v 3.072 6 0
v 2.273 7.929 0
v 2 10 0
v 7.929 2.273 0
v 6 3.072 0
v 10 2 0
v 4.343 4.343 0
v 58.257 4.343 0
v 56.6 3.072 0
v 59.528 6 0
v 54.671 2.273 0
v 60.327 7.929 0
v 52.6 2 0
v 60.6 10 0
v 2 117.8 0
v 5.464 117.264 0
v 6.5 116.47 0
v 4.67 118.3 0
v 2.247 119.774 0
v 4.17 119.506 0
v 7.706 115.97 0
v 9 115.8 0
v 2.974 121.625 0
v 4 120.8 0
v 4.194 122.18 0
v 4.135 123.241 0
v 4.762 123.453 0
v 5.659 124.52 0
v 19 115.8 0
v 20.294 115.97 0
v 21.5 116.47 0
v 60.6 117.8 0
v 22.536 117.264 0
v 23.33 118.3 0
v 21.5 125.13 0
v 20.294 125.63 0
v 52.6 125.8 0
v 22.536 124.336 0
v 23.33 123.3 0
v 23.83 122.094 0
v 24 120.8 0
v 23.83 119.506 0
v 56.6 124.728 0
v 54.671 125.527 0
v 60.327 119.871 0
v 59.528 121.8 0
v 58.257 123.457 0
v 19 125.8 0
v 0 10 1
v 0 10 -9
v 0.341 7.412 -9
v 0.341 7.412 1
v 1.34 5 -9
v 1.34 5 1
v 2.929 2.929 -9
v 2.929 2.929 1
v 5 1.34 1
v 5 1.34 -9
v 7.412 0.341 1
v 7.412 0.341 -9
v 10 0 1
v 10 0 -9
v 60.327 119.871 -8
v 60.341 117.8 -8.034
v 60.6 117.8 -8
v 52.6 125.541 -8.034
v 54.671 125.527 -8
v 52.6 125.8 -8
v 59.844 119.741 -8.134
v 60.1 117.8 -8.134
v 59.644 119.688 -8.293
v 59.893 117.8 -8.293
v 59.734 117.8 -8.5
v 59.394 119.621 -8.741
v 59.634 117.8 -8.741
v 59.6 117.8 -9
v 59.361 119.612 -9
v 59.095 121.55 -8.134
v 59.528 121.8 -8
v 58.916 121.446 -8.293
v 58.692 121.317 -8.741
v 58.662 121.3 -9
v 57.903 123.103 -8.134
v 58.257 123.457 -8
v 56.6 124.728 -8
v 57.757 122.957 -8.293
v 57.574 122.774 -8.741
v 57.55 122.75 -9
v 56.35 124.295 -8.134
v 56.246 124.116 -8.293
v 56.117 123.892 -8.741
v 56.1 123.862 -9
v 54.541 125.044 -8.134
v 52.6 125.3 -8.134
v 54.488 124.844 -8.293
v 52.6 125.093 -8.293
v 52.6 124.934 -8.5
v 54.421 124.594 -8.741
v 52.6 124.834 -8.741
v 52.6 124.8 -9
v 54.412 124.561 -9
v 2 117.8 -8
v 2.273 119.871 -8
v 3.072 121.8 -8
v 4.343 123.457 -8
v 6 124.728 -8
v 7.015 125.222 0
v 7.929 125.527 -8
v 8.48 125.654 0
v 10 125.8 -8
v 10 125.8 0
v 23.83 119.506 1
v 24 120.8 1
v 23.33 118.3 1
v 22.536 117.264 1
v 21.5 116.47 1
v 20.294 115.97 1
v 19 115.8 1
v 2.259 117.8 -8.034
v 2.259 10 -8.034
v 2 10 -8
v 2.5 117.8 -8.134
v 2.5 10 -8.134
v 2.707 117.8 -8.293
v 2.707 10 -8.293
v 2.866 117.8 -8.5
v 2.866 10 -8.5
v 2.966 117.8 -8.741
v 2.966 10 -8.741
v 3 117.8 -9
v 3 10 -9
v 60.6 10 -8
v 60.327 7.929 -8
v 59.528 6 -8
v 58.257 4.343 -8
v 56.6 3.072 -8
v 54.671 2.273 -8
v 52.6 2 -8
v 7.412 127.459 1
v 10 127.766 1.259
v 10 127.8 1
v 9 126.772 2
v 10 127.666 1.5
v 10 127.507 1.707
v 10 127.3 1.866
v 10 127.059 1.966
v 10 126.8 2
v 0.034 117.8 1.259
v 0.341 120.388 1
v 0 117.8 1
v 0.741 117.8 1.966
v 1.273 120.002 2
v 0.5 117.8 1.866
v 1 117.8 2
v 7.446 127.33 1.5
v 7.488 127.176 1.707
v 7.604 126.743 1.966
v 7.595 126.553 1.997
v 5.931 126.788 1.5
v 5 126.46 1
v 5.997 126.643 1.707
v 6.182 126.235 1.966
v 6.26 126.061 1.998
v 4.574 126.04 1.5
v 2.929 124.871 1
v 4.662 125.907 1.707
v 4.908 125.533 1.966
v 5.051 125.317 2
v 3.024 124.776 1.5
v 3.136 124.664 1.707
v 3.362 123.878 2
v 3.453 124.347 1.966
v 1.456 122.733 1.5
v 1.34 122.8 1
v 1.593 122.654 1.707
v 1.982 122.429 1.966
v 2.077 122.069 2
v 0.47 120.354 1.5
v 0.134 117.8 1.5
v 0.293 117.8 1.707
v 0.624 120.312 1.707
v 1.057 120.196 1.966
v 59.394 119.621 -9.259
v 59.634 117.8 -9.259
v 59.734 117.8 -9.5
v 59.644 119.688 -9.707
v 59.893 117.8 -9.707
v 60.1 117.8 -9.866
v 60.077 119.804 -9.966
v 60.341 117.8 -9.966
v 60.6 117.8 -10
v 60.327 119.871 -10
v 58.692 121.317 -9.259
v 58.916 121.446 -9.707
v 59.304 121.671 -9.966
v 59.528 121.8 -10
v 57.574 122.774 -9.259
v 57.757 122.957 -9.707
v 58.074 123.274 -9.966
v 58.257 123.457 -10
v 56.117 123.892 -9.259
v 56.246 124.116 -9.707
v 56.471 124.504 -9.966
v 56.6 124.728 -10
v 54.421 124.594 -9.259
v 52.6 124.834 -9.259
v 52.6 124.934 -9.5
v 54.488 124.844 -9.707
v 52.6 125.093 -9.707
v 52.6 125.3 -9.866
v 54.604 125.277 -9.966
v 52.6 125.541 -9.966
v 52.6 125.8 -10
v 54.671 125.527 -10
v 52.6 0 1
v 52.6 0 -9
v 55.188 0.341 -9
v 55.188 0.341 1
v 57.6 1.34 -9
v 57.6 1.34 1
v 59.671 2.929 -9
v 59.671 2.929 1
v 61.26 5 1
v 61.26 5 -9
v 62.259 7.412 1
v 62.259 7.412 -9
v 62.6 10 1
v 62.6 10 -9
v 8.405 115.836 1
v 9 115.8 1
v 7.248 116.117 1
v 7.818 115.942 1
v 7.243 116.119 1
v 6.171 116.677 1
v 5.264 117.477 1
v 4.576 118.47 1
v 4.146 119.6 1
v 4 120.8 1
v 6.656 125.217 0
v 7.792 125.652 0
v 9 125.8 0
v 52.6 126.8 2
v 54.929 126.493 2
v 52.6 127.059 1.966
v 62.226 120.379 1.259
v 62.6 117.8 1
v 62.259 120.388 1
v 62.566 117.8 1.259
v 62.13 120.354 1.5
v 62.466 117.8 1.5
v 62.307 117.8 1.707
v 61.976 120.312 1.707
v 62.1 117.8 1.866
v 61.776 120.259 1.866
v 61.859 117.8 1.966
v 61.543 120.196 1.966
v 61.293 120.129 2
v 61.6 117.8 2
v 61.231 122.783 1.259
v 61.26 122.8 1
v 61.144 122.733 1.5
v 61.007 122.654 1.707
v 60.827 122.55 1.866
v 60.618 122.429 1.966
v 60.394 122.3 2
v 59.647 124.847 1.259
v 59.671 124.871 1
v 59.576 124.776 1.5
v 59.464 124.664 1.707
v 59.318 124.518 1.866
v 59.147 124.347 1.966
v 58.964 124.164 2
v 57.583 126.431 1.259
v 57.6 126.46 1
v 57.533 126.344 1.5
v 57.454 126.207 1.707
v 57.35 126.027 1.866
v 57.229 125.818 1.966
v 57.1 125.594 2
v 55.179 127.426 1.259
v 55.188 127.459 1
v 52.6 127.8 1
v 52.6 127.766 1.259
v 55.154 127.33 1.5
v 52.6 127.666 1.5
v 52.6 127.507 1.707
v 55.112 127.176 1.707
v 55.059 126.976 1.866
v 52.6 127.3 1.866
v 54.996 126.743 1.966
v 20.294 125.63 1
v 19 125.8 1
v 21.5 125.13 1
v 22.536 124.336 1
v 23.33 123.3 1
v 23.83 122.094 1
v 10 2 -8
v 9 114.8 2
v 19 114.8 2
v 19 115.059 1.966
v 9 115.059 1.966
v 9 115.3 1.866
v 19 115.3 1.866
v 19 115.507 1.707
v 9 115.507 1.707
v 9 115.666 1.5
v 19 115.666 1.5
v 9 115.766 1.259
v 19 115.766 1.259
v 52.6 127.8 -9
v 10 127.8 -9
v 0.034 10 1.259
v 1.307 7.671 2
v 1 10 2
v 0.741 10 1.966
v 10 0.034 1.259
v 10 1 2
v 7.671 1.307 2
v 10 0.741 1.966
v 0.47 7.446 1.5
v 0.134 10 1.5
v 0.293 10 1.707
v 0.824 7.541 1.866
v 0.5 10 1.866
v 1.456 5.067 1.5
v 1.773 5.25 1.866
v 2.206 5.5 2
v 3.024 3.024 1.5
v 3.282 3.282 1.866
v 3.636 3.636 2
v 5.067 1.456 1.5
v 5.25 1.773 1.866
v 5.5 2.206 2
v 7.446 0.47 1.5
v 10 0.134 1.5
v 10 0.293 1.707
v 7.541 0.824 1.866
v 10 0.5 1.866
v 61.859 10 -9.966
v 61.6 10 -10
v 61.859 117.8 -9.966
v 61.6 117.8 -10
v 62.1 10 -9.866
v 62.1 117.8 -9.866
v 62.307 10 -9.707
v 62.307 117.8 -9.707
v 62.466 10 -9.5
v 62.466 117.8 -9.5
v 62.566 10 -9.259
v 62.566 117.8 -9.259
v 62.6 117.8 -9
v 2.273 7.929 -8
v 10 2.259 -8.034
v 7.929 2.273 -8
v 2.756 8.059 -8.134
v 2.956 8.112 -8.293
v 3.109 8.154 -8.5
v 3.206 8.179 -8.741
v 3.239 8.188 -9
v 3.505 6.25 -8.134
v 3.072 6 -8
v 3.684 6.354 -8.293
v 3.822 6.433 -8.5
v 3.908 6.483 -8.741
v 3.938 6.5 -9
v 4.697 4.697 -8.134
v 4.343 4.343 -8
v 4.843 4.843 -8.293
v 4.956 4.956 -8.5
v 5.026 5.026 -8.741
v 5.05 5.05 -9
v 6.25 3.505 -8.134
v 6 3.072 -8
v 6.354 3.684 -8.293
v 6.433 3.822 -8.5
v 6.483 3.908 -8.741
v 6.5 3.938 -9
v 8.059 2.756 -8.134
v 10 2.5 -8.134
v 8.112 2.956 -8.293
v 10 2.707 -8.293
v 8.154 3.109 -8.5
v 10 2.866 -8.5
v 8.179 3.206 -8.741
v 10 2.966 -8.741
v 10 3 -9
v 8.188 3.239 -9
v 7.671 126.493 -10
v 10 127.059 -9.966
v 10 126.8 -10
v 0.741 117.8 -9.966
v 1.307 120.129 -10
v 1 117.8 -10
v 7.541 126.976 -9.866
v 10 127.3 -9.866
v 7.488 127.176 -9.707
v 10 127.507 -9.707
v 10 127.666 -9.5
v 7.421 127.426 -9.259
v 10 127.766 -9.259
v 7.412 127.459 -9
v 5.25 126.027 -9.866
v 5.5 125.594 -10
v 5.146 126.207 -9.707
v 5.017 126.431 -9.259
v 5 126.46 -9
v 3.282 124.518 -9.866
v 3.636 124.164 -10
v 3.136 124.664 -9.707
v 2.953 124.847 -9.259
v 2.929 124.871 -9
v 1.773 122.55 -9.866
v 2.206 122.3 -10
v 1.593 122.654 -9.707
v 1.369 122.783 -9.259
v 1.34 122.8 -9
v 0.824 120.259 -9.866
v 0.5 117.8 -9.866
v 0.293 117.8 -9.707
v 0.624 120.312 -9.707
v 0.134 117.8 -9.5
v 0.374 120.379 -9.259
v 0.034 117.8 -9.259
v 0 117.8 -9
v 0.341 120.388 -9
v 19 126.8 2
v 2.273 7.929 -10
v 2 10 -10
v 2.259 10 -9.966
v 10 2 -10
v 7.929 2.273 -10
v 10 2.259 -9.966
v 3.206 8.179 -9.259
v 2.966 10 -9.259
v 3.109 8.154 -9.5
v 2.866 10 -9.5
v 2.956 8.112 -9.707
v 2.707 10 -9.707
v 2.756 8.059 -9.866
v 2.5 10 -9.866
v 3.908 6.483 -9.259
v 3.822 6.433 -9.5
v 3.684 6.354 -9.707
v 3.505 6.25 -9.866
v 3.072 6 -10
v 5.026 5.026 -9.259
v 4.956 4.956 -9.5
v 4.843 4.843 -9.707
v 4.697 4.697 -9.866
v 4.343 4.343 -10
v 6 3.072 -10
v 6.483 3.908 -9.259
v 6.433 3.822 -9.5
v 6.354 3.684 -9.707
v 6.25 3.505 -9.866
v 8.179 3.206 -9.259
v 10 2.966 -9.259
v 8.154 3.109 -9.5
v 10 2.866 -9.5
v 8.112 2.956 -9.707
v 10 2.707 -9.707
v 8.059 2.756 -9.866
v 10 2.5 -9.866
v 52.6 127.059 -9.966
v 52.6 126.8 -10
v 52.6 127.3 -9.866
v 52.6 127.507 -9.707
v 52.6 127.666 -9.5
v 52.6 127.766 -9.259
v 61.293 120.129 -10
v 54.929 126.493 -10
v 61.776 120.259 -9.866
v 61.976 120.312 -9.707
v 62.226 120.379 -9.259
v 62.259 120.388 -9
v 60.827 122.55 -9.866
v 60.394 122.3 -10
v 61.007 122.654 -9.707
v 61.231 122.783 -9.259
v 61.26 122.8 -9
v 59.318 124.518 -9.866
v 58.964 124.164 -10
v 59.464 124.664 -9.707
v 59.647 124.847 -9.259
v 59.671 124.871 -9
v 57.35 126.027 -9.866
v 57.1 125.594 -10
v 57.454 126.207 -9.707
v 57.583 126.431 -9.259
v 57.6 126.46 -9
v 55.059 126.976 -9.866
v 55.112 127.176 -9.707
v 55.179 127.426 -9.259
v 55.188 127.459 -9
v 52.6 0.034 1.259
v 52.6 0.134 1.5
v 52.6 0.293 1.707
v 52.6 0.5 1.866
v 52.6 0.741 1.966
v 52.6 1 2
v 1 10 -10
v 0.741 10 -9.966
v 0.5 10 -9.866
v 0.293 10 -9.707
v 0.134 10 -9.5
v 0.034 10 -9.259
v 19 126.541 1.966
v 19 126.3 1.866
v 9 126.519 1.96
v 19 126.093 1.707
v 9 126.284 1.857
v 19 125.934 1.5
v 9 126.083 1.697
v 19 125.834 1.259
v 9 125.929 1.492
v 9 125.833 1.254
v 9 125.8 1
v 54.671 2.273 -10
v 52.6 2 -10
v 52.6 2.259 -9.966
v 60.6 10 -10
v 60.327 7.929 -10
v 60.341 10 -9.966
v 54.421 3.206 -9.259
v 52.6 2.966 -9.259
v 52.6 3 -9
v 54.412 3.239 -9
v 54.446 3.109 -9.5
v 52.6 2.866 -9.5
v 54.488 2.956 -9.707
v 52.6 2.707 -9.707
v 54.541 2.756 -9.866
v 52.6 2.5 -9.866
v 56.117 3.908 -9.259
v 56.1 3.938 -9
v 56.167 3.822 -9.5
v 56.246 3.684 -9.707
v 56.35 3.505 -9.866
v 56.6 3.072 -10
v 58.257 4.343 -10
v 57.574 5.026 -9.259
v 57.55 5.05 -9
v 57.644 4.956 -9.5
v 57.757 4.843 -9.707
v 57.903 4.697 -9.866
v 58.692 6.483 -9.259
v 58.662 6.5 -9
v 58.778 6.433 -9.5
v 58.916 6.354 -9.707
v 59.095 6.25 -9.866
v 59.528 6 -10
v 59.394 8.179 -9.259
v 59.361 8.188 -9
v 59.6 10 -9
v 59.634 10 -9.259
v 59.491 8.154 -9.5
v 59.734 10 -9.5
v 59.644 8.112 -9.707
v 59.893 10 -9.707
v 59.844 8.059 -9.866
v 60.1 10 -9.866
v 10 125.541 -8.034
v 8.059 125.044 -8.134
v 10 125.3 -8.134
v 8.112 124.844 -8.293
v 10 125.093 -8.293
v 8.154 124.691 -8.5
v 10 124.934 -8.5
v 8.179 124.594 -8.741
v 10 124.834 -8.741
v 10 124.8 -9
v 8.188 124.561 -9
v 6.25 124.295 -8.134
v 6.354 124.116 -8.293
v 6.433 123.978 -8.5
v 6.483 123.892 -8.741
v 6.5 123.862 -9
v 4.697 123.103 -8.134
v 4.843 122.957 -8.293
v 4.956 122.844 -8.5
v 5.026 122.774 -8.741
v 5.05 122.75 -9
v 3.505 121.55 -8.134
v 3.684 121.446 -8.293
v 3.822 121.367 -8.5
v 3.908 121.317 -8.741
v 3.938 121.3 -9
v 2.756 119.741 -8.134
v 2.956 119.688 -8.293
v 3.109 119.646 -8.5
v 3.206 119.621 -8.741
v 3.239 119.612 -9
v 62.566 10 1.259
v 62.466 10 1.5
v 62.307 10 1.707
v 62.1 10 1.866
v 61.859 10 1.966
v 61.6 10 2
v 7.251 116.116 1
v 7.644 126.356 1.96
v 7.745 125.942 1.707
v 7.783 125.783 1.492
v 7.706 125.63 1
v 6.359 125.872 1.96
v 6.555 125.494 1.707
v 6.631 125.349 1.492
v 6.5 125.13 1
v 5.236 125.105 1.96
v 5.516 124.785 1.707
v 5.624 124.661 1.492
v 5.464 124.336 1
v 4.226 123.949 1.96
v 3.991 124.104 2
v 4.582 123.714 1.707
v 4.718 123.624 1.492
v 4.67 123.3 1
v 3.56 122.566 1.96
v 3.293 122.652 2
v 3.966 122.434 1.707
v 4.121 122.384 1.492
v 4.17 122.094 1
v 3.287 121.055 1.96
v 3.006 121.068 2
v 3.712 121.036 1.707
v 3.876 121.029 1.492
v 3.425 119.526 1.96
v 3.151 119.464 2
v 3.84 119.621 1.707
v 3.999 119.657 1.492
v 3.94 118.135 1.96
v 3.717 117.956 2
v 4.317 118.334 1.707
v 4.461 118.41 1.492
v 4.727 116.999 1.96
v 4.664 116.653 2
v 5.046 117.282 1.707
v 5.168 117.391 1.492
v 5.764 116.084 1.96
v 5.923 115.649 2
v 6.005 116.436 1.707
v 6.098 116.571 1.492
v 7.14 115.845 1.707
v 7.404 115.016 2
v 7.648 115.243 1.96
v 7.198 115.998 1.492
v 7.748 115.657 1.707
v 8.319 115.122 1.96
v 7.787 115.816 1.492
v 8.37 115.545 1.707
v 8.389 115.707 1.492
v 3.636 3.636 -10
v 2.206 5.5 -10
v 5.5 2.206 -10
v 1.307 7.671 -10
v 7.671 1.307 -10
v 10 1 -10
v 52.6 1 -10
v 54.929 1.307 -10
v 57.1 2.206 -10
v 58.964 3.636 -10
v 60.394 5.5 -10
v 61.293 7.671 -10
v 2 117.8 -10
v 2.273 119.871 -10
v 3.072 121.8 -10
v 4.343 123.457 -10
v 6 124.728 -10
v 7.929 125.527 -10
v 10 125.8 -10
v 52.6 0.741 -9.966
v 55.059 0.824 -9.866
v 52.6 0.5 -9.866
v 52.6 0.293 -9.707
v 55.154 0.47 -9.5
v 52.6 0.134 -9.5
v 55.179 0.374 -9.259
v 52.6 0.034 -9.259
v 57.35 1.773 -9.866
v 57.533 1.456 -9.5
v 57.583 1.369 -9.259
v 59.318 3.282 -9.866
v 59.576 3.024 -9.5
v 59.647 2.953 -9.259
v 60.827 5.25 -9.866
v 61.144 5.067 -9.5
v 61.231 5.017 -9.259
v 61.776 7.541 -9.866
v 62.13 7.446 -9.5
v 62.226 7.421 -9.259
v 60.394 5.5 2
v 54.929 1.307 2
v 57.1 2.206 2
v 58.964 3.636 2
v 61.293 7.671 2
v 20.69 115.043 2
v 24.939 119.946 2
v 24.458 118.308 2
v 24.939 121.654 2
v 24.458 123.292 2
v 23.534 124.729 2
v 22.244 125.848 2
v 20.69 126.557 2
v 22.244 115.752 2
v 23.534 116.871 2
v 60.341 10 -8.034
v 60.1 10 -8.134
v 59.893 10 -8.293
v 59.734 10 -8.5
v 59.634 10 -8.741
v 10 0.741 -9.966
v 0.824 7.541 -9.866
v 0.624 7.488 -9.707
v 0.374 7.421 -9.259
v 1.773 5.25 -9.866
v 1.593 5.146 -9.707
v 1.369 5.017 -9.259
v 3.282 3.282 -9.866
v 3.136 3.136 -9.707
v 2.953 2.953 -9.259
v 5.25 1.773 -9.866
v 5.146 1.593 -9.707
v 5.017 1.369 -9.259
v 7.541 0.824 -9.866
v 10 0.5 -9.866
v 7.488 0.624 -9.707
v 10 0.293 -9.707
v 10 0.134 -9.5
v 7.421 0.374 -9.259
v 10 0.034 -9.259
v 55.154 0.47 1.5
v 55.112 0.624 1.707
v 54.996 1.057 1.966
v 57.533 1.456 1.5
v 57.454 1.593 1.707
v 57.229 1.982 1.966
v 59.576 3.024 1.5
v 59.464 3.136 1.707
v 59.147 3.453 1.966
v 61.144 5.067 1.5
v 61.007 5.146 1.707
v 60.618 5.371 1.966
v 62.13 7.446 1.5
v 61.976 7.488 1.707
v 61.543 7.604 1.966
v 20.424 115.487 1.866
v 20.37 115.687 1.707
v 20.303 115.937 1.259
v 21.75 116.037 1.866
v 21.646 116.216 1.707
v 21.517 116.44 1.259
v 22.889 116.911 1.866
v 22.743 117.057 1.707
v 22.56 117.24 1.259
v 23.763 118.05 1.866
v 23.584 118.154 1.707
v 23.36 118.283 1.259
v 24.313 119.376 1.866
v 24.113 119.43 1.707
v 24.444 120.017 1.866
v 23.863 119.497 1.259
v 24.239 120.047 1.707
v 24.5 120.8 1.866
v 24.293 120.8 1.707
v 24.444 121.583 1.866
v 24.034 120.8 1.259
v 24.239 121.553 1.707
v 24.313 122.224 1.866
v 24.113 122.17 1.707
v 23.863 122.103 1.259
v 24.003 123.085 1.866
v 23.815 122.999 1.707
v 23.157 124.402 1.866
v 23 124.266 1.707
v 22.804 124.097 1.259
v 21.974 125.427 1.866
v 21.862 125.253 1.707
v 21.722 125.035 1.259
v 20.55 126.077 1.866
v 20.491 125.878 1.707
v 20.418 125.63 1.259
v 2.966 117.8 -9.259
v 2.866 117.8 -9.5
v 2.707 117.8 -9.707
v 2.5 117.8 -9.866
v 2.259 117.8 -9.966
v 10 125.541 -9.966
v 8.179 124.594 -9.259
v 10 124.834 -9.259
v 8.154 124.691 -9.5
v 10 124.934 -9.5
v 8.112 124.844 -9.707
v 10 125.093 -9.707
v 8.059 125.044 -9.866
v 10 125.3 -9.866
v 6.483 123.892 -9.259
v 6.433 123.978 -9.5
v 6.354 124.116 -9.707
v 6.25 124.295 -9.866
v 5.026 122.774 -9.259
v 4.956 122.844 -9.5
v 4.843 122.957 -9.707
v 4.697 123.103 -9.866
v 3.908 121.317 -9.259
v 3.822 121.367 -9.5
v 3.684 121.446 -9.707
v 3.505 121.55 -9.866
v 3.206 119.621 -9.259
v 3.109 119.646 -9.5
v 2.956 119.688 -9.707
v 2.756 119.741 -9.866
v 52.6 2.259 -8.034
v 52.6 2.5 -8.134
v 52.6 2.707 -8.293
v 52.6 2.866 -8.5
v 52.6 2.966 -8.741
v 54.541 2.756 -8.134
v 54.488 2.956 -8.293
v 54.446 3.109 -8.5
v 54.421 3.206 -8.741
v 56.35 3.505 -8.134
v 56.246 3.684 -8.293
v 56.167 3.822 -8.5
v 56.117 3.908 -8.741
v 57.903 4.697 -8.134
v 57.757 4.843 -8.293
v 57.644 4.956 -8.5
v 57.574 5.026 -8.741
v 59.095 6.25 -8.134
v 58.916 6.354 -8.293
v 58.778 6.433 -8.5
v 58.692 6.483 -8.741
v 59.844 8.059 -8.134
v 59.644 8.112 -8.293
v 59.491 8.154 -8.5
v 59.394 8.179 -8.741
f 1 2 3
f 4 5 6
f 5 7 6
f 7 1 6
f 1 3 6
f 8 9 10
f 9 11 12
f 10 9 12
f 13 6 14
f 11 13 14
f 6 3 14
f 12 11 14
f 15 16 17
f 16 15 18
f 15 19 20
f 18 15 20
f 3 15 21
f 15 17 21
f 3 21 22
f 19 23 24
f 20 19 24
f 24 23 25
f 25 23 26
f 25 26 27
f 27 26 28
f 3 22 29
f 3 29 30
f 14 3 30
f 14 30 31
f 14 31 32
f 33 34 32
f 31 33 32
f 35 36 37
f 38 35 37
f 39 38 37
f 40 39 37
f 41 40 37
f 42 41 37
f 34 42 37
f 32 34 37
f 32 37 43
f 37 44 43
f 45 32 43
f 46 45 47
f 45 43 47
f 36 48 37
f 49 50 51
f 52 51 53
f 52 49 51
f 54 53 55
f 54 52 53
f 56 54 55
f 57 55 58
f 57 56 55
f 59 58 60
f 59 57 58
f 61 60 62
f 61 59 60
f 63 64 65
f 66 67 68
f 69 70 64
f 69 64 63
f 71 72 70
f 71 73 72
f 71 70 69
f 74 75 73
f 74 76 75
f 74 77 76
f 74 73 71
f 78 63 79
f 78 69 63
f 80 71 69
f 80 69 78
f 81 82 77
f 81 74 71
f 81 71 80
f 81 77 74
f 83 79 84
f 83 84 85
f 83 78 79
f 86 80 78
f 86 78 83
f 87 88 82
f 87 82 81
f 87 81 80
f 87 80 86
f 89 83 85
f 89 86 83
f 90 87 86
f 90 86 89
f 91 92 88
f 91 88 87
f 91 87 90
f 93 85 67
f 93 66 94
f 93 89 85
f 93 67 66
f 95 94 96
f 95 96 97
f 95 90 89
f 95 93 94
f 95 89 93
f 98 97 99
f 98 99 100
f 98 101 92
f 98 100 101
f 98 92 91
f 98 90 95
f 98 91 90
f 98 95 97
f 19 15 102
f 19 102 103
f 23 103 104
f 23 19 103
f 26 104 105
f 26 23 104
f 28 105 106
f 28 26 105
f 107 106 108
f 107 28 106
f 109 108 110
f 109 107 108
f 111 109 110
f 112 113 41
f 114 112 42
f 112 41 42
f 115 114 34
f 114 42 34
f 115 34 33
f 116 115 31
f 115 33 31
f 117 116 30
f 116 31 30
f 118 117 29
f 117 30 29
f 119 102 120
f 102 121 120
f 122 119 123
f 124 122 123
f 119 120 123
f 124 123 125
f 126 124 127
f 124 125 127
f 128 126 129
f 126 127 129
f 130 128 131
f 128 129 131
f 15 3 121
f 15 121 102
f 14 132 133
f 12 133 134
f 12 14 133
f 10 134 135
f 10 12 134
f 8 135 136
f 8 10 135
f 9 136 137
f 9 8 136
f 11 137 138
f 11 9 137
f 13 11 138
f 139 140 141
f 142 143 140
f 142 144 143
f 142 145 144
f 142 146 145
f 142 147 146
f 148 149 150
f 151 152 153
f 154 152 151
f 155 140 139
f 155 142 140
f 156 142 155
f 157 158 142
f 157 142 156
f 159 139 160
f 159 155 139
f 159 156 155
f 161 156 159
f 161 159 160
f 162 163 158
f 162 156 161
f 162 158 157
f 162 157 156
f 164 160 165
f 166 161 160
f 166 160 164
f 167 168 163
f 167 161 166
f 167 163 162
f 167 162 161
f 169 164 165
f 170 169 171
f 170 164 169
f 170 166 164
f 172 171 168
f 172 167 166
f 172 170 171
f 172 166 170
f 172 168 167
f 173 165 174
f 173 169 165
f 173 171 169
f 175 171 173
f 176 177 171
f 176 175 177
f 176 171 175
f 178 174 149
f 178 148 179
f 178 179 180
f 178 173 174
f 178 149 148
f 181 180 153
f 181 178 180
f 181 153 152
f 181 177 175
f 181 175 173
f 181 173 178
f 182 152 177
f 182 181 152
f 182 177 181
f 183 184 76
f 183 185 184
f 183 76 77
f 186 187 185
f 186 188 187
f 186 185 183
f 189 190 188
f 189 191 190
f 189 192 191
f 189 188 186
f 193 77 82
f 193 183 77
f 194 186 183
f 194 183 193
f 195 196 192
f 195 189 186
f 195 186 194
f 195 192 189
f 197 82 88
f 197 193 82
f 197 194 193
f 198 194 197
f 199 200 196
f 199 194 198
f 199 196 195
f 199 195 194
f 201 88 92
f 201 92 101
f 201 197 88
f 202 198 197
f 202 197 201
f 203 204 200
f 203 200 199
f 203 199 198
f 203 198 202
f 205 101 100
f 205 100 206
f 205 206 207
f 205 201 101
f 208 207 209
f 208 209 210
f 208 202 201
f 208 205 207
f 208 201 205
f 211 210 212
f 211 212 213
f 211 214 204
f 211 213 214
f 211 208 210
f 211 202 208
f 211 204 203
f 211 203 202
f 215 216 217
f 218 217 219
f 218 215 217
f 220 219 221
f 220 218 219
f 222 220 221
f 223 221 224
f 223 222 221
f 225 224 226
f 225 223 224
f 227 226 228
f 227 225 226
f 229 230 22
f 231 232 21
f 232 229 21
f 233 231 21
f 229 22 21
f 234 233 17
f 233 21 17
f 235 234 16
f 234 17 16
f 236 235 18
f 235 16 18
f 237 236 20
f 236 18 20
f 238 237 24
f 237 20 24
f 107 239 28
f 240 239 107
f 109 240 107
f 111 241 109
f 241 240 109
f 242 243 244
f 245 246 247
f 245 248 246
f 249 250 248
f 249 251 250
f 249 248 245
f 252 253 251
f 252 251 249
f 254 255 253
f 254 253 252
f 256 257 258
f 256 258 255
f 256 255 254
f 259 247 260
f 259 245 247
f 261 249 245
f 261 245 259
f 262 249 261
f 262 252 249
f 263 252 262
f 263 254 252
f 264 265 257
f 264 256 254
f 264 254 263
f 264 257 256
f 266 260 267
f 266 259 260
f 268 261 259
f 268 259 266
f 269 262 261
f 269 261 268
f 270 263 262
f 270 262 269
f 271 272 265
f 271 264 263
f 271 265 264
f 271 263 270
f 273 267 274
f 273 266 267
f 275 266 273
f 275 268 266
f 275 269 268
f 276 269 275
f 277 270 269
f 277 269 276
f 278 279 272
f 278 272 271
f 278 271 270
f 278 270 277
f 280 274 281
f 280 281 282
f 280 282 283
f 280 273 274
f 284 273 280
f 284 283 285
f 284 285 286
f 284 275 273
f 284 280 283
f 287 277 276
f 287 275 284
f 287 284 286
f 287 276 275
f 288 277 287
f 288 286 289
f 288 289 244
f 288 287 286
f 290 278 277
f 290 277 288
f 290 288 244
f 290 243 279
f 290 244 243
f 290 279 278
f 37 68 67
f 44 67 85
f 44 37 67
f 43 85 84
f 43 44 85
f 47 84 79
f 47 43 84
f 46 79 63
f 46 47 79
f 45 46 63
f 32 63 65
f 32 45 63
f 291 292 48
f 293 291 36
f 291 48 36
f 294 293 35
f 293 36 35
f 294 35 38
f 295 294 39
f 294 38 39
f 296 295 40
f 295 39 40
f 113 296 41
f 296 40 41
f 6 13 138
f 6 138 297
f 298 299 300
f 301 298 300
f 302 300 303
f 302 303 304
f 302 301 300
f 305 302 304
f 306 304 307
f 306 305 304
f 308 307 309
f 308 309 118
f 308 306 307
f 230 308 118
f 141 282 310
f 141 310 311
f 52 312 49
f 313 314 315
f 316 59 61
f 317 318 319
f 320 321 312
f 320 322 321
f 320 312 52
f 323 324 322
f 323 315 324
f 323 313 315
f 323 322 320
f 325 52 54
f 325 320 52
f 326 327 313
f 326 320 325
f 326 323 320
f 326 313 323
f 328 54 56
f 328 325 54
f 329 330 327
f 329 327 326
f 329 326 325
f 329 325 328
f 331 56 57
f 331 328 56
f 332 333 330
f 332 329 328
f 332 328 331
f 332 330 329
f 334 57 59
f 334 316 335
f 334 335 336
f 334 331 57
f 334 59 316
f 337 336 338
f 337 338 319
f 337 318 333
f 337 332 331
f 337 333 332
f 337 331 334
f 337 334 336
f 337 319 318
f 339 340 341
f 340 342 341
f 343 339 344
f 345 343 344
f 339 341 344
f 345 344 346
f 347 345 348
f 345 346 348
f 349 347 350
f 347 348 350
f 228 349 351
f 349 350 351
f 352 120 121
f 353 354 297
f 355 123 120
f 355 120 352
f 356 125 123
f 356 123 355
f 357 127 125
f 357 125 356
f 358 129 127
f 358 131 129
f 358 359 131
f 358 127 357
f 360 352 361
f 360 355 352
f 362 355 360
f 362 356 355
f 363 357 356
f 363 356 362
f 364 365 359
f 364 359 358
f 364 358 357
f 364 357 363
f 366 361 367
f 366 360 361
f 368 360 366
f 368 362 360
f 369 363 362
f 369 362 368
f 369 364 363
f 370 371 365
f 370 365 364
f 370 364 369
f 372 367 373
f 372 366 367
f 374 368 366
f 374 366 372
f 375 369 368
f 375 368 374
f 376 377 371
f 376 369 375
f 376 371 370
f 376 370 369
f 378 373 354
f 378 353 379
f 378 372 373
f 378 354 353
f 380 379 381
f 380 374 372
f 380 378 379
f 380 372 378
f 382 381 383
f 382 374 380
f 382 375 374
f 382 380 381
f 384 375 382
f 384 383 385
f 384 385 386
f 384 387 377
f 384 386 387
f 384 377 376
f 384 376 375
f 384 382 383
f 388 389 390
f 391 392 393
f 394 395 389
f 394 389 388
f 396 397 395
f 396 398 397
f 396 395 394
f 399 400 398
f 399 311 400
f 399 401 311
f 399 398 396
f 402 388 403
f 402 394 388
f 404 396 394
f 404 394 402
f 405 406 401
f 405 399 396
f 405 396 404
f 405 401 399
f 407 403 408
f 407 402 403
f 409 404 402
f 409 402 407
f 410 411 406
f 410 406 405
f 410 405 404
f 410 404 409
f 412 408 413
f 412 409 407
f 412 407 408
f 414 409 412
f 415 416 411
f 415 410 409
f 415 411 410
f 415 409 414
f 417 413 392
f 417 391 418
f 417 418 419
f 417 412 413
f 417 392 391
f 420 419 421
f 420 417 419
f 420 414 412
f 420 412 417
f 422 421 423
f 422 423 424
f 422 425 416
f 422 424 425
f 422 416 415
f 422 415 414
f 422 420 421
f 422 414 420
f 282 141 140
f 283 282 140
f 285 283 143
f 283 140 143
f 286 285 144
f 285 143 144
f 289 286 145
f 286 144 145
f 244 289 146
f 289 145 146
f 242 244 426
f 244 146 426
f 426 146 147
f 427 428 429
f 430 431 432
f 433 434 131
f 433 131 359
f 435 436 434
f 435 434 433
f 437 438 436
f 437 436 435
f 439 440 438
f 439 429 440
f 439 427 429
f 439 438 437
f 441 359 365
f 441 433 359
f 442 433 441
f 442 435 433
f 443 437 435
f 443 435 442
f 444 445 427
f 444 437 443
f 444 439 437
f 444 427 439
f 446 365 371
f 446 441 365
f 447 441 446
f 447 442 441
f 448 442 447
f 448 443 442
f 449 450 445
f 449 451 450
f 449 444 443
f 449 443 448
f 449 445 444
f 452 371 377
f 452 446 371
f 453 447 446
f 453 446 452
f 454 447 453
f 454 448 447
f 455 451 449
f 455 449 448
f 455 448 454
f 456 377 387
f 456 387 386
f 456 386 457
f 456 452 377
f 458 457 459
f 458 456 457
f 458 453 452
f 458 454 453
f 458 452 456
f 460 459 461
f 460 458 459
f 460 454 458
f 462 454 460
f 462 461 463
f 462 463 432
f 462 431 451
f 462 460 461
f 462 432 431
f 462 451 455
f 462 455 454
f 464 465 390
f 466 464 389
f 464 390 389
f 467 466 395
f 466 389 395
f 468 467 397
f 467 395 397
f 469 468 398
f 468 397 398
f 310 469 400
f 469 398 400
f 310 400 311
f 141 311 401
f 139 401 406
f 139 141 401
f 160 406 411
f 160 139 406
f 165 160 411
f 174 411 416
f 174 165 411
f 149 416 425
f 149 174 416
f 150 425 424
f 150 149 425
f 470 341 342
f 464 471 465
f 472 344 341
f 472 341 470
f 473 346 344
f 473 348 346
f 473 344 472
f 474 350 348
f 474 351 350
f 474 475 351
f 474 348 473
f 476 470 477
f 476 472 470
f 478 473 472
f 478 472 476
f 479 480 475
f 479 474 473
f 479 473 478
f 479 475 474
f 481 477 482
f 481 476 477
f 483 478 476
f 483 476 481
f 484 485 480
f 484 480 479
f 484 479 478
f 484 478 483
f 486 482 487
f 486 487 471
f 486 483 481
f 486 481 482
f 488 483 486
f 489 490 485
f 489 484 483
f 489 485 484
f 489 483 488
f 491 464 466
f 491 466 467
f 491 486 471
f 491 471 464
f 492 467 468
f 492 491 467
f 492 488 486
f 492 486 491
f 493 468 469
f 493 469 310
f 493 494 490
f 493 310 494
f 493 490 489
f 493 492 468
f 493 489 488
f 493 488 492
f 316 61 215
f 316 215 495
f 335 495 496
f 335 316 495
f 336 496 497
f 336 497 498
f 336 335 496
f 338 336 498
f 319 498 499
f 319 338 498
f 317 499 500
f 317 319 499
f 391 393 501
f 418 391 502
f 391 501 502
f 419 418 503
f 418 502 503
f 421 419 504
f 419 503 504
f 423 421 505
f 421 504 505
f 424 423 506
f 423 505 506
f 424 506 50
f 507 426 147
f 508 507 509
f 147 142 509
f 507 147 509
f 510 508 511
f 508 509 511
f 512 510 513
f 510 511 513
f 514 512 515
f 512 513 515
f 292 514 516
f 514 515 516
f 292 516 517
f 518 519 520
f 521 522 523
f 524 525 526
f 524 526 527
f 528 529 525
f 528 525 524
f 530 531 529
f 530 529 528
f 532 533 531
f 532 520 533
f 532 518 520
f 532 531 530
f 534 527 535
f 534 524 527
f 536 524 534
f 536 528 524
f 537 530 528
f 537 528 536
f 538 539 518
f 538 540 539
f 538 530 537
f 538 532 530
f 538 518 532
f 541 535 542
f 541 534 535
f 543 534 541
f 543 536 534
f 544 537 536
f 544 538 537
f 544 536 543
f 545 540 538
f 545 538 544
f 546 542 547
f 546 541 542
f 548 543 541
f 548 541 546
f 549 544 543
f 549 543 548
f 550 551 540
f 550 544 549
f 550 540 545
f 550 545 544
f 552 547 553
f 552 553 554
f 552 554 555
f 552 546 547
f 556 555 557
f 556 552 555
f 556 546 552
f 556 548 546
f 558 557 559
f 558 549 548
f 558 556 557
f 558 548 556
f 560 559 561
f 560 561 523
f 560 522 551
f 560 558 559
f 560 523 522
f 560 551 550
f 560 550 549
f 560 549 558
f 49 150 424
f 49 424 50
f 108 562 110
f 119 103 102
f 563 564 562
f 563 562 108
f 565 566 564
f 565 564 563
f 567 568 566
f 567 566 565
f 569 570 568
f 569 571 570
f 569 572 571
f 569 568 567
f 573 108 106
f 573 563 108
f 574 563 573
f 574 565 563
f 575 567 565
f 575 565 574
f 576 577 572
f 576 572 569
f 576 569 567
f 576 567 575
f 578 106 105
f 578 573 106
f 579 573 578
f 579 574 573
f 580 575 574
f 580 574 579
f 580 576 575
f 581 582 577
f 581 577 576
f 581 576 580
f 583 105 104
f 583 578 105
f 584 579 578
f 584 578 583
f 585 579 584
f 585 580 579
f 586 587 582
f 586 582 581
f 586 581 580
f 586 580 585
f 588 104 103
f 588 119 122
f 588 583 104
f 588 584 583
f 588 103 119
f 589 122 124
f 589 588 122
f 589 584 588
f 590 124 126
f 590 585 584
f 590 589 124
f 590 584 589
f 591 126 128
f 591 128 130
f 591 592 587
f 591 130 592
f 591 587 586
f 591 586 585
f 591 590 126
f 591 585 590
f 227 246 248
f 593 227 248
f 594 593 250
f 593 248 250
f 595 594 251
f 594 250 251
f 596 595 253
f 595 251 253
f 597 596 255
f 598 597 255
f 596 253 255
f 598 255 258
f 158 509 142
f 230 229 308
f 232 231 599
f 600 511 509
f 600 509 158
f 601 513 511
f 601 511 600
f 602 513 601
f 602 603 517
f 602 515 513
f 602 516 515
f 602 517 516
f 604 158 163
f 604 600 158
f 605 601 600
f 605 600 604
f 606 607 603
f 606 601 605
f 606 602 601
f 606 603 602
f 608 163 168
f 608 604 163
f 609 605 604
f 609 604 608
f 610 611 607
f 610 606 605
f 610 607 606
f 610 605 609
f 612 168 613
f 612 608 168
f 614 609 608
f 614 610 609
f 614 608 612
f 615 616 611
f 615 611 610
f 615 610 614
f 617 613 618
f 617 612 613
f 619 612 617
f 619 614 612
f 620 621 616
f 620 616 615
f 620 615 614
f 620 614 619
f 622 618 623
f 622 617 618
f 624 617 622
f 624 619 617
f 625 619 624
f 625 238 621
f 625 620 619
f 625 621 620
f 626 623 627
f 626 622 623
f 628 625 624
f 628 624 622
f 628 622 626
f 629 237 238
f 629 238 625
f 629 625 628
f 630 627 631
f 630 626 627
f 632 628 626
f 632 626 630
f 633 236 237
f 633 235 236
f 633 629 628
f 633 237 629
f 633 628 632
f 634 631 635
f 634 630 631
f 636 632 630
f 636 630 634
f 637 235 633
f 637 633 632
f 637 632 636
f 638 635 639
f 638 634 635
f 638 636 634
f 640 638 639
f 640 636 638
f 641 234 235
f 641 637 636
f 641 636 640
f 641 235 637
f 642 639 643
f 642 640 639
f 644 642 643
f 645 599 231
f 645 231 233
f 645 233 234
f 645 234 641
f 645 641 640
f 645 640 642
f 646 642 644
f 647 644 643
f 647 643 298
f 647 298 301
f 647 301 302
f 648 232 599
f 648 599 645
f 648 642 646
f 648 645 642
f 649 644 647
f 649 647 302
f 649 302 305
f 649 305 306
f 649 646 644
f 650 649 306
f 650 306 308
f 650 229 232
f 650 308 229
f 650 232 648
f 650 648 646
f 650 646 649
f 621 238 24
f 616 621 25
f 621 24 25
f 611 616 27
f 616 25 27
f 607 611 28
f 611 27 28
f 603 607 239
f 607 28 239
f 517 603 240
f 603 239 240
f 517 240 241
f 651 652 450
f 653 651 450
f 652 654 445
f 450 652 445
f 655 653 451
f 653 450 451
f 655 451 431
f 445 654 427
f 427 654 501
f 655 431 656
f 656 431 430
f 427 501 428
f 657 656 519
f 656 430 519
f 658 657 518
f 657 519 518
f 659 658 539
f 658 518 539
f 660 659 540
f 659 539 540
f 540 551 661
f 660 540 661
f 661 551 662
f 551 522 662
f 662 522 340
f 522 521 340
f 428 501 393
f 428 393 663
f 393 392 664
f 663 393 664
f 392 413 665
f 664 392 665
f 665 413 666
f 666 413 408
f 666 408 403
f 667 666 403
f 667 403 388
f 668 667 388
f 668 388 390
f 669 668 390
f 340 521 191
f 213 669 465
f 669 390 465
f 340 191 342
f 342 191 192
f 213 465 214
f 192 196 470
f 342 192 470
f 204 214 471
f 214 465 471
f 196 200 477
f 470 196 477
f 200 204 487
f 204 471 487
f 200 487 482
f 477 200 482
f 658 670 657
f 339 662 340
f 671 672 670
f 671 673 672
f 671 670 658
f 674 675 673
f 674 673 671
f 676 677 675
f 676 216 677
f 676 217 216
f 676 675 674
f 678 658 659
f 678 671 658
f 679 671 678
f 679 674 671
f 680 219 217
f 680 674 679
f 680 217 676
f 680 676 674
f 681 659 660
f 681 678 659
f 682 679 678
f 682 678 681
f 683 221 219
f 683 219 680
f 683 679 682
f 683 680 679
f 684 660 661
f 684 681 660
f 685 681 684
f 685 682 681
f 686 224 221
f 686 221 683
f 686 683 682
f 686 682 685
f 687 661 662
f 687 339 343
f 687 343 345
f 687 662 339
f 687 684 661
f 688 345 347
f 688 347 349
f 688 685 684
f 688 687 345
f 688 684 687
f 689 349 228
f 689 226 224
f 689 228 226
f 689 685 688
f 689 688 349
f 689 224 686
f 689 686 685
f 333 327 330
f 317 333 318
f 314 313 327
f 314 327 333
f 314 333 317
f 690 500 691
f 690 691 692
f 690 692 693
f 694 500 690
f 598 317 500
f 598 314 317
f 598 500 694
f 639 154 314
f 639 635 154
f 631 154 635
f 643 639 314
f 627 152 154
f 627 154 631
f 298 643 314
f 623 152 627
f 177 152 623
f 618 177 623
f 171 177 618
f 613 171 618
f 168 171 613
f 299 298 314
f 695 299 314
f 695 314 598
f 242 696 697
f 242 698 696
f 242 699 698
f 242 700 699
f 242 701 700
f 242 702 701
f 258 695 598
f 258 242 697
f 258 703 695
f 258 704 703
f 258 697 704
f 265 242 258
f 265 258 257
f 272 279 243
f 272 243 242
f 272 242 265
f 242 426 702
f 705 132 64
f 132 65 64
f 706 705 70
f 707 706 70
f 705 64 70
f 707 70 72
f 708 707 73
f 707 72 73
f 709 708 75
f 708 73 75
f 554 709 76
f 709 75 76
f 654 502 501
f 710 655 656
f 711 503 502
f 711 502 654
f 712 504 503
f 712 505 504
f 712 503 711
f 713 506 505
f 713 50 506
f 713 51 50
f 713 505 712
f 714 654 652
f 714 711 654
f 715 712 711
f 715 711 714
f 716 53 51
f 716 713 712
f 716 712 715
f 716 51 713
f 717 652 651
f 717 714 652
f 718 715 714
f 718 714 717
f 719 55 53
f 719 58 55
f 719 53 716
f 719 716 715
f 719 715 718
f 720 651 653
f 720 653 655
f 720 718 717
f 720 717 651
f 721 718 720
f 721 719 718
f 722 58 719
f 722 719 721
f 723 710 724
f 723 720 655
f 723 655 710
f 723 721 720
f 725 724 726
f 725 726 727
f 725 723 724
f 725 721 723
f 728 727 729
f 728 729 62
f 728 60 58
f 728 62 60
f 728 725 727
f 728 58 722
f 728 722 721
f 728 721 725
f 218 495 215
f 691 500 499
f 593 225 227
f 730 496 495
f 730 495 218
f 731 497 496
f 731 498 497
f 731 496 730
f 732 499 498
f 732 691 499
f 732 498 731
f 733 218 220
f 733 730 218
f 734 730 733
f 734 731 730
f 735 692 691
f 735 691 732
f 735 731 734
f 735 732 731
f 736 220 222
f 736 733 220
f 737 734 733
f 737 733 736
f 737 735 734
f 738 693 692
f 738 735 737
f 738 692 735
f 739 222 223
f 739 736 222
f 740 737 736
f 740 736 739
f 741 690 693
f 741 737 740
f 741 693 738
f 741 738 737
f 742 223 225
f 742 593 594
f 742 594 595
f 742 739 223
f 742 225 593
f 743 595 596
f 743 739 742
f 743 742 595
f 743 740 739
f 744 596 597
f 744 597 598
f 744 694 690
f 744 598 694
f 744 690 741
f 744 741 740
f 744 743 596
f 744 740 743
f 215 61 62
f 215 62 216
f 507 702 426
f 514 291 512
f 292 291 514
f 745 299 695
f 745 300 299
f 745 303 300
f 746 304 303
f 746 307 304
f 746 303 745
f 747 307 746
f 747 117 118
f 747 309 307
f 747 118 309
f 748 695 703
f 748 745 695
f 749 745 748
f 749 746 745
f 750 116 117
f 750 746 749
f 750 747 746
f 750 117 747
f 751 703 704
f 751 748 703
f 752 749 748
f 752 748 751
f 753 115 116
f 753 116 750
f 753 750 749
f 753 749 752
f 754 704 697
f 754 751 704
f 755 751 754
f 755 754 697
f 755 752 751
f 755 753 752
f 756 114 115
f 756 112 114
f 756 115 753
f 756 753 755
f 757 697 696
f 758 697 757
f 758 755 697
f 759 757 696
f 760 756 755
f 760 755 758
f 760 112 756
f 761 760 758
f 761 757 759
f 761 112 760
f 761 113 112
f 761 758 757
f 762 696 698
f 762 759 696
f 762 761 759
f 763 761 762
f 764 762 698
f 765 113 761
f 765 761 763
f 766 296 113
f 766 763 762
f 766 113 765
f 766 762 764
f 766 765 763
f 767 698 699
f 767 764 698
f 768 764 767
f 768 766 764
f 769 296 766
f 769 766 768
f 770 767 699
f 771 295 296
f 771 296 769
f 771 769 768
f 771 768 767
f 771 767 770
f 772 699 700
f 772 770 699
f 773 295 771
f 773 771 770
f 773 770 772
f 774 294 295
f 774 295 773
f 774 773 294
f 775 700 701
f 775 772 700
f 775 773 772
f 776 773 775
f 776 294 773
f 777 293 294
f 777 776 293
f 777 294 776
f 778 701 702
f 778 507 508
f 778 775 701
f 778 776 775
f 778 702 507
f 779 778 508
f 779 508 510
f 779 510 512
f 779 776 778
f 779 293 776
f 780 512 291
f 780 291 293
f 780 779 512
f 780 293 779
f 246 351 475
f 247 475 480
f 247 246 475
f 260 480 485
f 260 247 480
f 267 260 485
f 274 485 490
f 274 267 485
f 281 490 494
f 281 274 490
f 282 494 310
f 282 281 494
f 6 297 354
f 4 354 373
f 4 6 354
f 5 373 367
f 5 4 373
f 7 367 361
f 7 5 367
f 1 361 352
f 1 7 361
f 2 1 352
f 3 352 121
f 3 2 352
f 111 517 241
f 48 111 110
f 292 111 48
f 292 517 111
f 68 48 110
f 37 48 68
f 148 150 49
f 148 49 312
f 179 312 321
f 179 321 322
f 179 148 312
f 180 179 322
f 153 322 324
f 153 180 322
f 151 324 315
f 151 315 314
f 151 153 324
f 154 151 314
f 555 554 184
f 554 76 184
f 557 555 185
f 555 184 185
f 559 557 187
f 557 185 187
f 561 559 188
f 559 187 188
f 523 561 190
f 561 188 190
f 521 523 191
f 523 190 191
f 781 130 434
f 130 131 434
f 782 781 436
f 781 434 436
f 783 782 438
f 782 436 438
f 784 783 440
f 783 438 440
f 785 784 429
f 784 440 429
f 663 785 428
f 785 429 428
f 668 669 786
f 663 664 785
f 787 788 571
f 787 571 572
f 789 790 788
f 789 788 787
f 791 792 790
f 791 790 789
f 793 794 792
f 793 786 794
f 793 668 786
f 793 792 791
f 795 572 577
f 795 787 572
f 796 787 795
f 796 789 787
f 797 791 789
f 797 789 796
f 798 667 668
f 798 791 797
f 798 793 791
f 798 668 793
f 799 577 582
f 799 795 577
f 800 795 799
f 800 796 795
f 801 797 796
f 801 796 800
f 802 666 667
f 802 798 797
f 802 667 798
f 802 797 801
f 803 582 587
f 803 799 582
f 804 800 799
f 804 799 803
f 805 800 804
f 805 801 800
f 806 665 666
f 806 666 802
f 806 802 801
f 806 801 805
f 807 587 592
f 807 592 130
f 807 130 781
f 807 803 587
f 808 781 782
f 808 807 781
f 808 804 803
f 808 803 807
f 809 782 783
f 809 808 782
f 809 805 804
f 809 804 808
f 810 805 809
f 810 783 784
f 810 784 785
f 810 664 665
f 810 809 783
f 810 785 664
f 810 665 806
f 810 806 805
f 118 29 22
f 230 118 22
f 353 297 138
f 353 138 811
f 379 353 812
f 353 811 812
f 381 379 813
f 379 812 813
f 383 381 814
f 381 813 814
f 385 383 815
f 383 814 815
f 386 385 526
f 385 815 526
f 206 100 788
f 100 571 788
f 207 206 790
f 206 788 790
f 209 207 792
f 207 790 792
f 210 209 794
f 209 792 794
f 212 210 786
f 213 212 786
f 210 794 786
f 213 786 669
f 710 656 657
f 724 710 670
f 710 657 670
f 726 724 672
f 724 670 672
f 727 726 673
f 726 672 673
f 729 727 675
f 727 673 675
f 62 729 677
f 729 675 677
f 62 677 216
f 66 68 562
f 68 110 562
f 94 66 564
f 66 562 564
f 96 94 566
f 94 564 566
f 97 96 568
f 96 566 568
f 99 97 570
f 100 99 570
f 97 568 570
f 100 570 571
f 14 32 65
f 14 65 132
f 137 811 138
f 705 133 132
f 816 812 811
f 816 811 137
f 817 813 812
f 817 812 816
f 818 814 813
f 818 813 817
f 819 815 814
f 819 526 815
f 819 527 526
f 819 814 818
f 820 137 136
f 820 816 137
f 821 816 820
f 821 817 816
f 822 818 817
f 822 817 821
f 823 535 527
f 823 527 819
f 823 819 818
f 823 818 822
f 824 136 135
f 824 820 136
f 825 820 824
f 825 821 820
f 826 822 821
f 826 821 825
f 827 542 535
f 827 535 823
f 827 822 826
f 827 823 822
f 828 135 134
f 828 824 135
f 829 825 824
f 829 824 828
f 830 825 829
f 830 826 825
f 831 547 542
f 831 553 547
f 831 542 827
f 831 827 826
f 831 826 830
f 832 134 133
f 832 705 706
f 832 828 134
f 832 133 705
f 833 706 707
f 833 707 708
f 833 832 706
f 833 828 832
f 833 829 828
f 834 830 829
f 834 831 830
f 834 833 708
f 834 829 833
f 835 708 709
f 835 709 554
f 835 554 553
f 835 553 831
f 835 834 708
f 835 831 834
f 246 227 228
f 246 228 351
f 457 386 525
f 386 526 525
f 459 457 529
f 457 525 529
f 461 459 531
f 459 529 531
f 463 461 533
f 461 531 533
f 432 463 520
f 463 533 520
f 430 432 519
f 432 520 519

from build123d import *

# Parameters (mm, degrees)
F1_DEPTH     = 2
F3_DEPTH     = 10
F5_DEPTH     = 2
F6_R         = 1
F7_R         = 0.99999
F8_R         = 1
F9_T1_DEPTH  = 42.6
F9_T3_DEPTH  = 107.8
F9_T5_DEPTH  = 10
F9_T8_ANGLE  = 90
F9_T10_ANGLE = 90
F9_T12_ANGLE = 90
F9_T14_ANGLE = 90
F9_T16_ANGLE = 180
F9_T18_ANGLE = 180


# Not quite as in the source:
# - a fillet or chamfer that OpenCascade refuses, or shapes differently, is made with other operations: its cross-section is extruded or revolved along the edge and cut away or added
# - a fillet or chamfer is up to 0.001 mm smaller than in the source, because OpenCascade refuses the exact size


with BuildPart() as f1:
    # F0 (on Top) → F1 (new body)
    with BuildSketch(Plane.XY):
        with BuildLine():
            ThreePointArc((0, 10), (2.9289321881, 2.9289321881), (10, 0))
            Line((10, 0), (52.6, 0))
            ThreePointArc((52.6, 0), (59.6710678119, 2.9289321881), (62.6, 10))
            Line((62.6, 10), (62.6, 117.8))
            ThreePointArc((62.6, 117.8), (59.6710678119, 124.8710678119), (52.6, 127.8))
            Line((52.6, 127.8), (10, 127.8))
            ThreePointArc((10, 127.8), (2.9289321881, 124.8710678119), (0, 117.8))
            Line((0, 117.8), (0, 10))
        make_face()
        with BuildLine():
            ThreePointArc((4, 120.8), (5.4644660941, 124.3355339059), (9, 125.8))
            Line((9, 125.8), (19, 125.8))
            ThreePointArc((19, 125.8), (22.5355339059, 124.3355339059), (24, 120.8))
            ThreePointArc((24, 120.8), (22.5355339059, 117.2644660941), (19, 115.8))
            Line((19, 115.8), (9, 115.8))
            ThreePointArc((9, 115.8), (5.4644660941, 117.2644660941), (4, 120.8))
        make_face(mode=Mode.SUBTRACT)
    extrude(amount=F1_DEPTH)

    # F2 (on Top) → F3 (join)
    with BuildSketch(Plane.XY):
        with BuildLine():
            ThreePointArc((0, 10), (2.9289321881, 2.9289321881), (10, 0))
            Line((10, 0), (52.6, 0))
            ThreePointArc((52.6, 0), (59.6710678119, 2.9289321881), (62.6, 10))
            Line((62.6, 10), (62.6, 117.8))
            ThreePointArc((62.6, 117.8), (59.6710678119, 124.8710678119), (52.6, 127.8))
            Line((52.6, 127.8), (10, 127.8))
            ThreePointArc((10, 127.8), (2.9289321881, 124.8710678119), (0, 117.8))
            Line((0, 117.8), (0, 10))
        make_face()
        with BuildLine():
            ThreePointArc((10, 2), (4.3431457505, 4.3431457505), (2, 10))
            Line((2, 10), (2, 117.8))
            ThreePointArc((2, 117.8), (4.3431457505, 123.4568542495), (10, 125.8))
            Line((10, 125.8), (52.6, 125.8))
            ThreePointArc((52.6, 125.8), (58.2568542495, 123.4568542495), (60.6, 117.8))
            Line((60.6, 117.8), (60.6, 10))
            ThreePointArc((60.6, 10), (58.2568542495, 4.3431457505), (52.6, 2))
            Line((52.6, 2), (10, 2))
        make_face(mode=Mode.SUBTRACT)
    extrude(amount=-F3_DEPTH)

    # F4 (on face) → F5 (join)
    with BuildSketch(Plane(origin=(0, 0, -10), x_dir=(1, 0, 0), z_dir=(0, 0, -1))):
        with BuildLine():
            ThreePointArc((0, -117.8), (2.9289321881, -124.8710678119), (10, -127.8))
            Line((10, -127.8), (52.6, -127.8))
            ThreePointArc((52.6, -127.8), (59.6710678119, -124.8710678119), (62.6, -117.8))
            Line((62.6, -117.8), (62.6, -10))
            ThreePointArc((62.6, -10), (59.6710678119, -2.9289321881), (52.6, 0))
            Line((52.6, 0), (10, 0))
            ThreePointArc((10, 0), (2.9289321881, -2.9289321881), (0, -10))
            Line((0, -10), (0, -117.8))
        make_face()
        with BuildLine():
            ThreePointArc((10, -124.8), (5.0502525317, -122.7497474683), (3, -117.8))
            Line((3, -117.8), (3, -10))
            ThreePointArc((3, -10), (5.0502525317, -5.0502525317), (10, -3))
            Line((10, -3), (52.6, -3))
            ThreePointArc((52.6, -3), (57.5497474683, -5.0502525317), (59.6, -10))
            Line((59.6, -10), (59.6, -117.8))
            ThreePointArc((59.6, -117.8), (57.5497474683, -122.7497474683), (52.6, -124.8))
            Line((52.6, -124.8), (10, -124.8))
        make_face(mode=Mode.SUBTRACT)
    extrude(amount=-F5_DEPTH)

    # F6
    f6_edges = [f1.edges().sort_by_distance(p)[0] for p in [
        (31.3, 124.8, -10),
    ]]
    fillet(f6_edges, radius=F6_R)

    # F7 (radius 1 in the source; OpenCascade refuses exactly that, so slightly less here)
    f7_edges = [f1.edges().sort_by_distance(p)[0] for p in [
        (31.3, 124.8, -8),
        (57.549747, 122.749747, -8),
        (59.6, 63.9, -8),
        (57.549747, 5.050253, -8),
        (31.3, 3, -8),
        (5.050253, 5.050253, -8),
        (3, 63.9, -8),
        (5.050253, 122.749747, -8),
    ]]
    fillet(f7_edges, radius=F7_R)

    # F8
    f8_edges = [f1.edges().sort_by_distance(p)[0] for p in [
        (62.6, 63.9, -10),
        (59.671068, 124.871068, -10),
        (31.3, 127.8, -10),
        (2.928932, 124.871068, -10),
        (0, 63.9, -10),
        (2.928932, 2.928932, -10),
        (31.3, 0, -10),
        (59.671068, 2.928932, -10),
    ]]
    fillet(f8_edges, radius=F8_R)

    # F9: fillet of radius 1 on 12 edges, made by hand

    # F9_s2 → F9_t1 (cut)
    with BuildSketch(Plane.YZ.offset(10)):
        with BuildLine():
            ThreePointArc((0, 1), (0.2928932188, 1.7071067812), (1, 2))
            Line((1, 2), (0, 2))
            Line((0, 2), (0, 1))
        make_face()
        with BuildLine():
            ThreePointArc((127.8, 1), (127.5071067812, 1.7071067812), (126.8, 2))
            Line((126.8, 2), (127.8, 2))
            Line((127.8, 2), (127.8, 1))
        make_face()
    extrude(amount=F9_T1_DEPTH, mode=Mode.SUBTRACT)

    # F9_s4 → F9_t3 (cut)
    with BuildSketch(Plane.XZ.offset(-117.8)):
        with BuildLine():
            ThreePointArc((0, 1), (0.2928932188, 1.7071067812), (1, 2))
            Line((1, 2), (0, 2))
            Line((0, 2), (0, 1))
        make_face()
        with BuildLine():
            ThreePointArc((62.6, 1), (62.3071067812, 1.7071067812), (61.6, 2))
            Line((61.6, 2), (62.6, 2))
            Line((62.6, 2), (62.6, 1))
        make_face()
    extrude(amount=F9_T3_DEPTH, mode=Mode.SUBTRACT)

    # F9_s6 → F9_t5 (cut)
    with BuildSketch(Plane.YZ.offset(9)):
        with BuildLine():
            ThreePointArc((126.8, 2), (126.0928932188, 1.7071067812), (125.8, 1))
            Line((125.8, 1), (125.8, 2))
            Line((125.8, 2), (126.8, 2))
        make_face()
        with BuildLine():
            ThreePointArc((114.8, 2), (115.5071067812, 1.7071067812), (115.8, 1))
            Line((115.8, 1), (115.8, 2))
            Line((115.8, 2), (114.8, 2))
        make_face()
    extrude(amount=F9_T5_DEPTH, mode=Mode.SUBTRACT)

    # F9_s7 → F9_t8 (revolve, cut)
    with BuildSketch(Plane.XZ.offset(-10)):
        with BuildLine():
            ThreePointArc((0, 1), (0.2928932188, 1.7071067812), (1, 2))
            Line((1, 2), (0, 2))
            Line((0, 2), (0, 1))
        make_face()
    revolve(axis=Axis((10, 10, 2), (0, 0, 1)), revolution_arc=F9_T8_ANGLE, mode=Mode.SUBTRACT)

    # F9_s9 → F9_t10 (revolve, cut)
    with BuildSketch(Plane.YZ.offset(52.6)):
        with BuildLine():
            ThreePointArc((0, 1), (0.2928932188, 1.7071067812), (1, 2))
            Line((1, 2), (0, 2))
            Line((0, 2), (0, 1))
        make_face()
    revolve(axis=Axis((52.6, 10, 2), (0, 0, 1)), revolution_arc=F9_T10_ANGLE, mode=Mode.SUBTRACT)

    # F9_s11 → F9_t12 (revolve, cut)
    with BuildSketch(Plane.XZ.offset(-117.8)):
        with BuildLine():
            ThreePointArc((62.6, 1), (62.3071067812, 1.7071067812), (61.6, 2))
            Line((61.6, 2), (62.6, 2))
            Line((62.6, 2), (62.6, 1))
        make_face()
    revolve(axis=Axis((52.6, 117.8, 2), (0, 0, 1)), revolution_arc=F9_T12_ANGLE, mode=Mode.SUBTRACT)

    # F9_s13 → F9_t14 (revolve, cut)
    with BuildSketch(Plane.YZ.offset(10)):
        with BuildLine():
            ThreePointArc((127.8, 1), (127.5071067812, 1.7071067812), (126.8, 2))
            Line((126.8, 2), (127.8, 2))
            Line((127.8, 2), (127.8, 1))
        make_face()
    revolve(axis=Axis((10, 117.8, 2), (0, 0, 1)), revolution_arc=F9_T14_ANGLE, mode=Mode.SUBTRACT)

    # F9_s15 → F9_t16 (revolve, cut)
    with BuildSketch(Plane.YZ.offset(9)):
        with BuildLine():
            ThreePointArc((126.8, 2), (126.0928932188, 1.7071067812), (125.8, 1))
            Line((125.8, 1), (125.8, 2))
            Line((125.8, 2), (126.8, 2))
        make_face()
    revolve(axis=Axis((9, 120.8, 2), (0, 0, 1)), revolution_arc=F9_T16_ANGLE, mode=Mode.SUBTRACT)

    # F9_s17 → F9_t18 (revolve, cut)
    with BuildSketch(Plane.YZ.offset(19)):
        with BuildLine():
            ThreePointArc((114.8, 2), (115.5071067812, 1.7071067812), (115.8, 1))
            Line((115.8, 1), (115.8, 2))
            Line((115.8, 2), (114.8, 2))
        make_face()
    revolve(axis=Axis((19, 120.8, 2), (0, 0, 1)), revolution_arc=F9_T18_ANGLE, mode=Mode.SUBTRACT)


solid = f1.part
